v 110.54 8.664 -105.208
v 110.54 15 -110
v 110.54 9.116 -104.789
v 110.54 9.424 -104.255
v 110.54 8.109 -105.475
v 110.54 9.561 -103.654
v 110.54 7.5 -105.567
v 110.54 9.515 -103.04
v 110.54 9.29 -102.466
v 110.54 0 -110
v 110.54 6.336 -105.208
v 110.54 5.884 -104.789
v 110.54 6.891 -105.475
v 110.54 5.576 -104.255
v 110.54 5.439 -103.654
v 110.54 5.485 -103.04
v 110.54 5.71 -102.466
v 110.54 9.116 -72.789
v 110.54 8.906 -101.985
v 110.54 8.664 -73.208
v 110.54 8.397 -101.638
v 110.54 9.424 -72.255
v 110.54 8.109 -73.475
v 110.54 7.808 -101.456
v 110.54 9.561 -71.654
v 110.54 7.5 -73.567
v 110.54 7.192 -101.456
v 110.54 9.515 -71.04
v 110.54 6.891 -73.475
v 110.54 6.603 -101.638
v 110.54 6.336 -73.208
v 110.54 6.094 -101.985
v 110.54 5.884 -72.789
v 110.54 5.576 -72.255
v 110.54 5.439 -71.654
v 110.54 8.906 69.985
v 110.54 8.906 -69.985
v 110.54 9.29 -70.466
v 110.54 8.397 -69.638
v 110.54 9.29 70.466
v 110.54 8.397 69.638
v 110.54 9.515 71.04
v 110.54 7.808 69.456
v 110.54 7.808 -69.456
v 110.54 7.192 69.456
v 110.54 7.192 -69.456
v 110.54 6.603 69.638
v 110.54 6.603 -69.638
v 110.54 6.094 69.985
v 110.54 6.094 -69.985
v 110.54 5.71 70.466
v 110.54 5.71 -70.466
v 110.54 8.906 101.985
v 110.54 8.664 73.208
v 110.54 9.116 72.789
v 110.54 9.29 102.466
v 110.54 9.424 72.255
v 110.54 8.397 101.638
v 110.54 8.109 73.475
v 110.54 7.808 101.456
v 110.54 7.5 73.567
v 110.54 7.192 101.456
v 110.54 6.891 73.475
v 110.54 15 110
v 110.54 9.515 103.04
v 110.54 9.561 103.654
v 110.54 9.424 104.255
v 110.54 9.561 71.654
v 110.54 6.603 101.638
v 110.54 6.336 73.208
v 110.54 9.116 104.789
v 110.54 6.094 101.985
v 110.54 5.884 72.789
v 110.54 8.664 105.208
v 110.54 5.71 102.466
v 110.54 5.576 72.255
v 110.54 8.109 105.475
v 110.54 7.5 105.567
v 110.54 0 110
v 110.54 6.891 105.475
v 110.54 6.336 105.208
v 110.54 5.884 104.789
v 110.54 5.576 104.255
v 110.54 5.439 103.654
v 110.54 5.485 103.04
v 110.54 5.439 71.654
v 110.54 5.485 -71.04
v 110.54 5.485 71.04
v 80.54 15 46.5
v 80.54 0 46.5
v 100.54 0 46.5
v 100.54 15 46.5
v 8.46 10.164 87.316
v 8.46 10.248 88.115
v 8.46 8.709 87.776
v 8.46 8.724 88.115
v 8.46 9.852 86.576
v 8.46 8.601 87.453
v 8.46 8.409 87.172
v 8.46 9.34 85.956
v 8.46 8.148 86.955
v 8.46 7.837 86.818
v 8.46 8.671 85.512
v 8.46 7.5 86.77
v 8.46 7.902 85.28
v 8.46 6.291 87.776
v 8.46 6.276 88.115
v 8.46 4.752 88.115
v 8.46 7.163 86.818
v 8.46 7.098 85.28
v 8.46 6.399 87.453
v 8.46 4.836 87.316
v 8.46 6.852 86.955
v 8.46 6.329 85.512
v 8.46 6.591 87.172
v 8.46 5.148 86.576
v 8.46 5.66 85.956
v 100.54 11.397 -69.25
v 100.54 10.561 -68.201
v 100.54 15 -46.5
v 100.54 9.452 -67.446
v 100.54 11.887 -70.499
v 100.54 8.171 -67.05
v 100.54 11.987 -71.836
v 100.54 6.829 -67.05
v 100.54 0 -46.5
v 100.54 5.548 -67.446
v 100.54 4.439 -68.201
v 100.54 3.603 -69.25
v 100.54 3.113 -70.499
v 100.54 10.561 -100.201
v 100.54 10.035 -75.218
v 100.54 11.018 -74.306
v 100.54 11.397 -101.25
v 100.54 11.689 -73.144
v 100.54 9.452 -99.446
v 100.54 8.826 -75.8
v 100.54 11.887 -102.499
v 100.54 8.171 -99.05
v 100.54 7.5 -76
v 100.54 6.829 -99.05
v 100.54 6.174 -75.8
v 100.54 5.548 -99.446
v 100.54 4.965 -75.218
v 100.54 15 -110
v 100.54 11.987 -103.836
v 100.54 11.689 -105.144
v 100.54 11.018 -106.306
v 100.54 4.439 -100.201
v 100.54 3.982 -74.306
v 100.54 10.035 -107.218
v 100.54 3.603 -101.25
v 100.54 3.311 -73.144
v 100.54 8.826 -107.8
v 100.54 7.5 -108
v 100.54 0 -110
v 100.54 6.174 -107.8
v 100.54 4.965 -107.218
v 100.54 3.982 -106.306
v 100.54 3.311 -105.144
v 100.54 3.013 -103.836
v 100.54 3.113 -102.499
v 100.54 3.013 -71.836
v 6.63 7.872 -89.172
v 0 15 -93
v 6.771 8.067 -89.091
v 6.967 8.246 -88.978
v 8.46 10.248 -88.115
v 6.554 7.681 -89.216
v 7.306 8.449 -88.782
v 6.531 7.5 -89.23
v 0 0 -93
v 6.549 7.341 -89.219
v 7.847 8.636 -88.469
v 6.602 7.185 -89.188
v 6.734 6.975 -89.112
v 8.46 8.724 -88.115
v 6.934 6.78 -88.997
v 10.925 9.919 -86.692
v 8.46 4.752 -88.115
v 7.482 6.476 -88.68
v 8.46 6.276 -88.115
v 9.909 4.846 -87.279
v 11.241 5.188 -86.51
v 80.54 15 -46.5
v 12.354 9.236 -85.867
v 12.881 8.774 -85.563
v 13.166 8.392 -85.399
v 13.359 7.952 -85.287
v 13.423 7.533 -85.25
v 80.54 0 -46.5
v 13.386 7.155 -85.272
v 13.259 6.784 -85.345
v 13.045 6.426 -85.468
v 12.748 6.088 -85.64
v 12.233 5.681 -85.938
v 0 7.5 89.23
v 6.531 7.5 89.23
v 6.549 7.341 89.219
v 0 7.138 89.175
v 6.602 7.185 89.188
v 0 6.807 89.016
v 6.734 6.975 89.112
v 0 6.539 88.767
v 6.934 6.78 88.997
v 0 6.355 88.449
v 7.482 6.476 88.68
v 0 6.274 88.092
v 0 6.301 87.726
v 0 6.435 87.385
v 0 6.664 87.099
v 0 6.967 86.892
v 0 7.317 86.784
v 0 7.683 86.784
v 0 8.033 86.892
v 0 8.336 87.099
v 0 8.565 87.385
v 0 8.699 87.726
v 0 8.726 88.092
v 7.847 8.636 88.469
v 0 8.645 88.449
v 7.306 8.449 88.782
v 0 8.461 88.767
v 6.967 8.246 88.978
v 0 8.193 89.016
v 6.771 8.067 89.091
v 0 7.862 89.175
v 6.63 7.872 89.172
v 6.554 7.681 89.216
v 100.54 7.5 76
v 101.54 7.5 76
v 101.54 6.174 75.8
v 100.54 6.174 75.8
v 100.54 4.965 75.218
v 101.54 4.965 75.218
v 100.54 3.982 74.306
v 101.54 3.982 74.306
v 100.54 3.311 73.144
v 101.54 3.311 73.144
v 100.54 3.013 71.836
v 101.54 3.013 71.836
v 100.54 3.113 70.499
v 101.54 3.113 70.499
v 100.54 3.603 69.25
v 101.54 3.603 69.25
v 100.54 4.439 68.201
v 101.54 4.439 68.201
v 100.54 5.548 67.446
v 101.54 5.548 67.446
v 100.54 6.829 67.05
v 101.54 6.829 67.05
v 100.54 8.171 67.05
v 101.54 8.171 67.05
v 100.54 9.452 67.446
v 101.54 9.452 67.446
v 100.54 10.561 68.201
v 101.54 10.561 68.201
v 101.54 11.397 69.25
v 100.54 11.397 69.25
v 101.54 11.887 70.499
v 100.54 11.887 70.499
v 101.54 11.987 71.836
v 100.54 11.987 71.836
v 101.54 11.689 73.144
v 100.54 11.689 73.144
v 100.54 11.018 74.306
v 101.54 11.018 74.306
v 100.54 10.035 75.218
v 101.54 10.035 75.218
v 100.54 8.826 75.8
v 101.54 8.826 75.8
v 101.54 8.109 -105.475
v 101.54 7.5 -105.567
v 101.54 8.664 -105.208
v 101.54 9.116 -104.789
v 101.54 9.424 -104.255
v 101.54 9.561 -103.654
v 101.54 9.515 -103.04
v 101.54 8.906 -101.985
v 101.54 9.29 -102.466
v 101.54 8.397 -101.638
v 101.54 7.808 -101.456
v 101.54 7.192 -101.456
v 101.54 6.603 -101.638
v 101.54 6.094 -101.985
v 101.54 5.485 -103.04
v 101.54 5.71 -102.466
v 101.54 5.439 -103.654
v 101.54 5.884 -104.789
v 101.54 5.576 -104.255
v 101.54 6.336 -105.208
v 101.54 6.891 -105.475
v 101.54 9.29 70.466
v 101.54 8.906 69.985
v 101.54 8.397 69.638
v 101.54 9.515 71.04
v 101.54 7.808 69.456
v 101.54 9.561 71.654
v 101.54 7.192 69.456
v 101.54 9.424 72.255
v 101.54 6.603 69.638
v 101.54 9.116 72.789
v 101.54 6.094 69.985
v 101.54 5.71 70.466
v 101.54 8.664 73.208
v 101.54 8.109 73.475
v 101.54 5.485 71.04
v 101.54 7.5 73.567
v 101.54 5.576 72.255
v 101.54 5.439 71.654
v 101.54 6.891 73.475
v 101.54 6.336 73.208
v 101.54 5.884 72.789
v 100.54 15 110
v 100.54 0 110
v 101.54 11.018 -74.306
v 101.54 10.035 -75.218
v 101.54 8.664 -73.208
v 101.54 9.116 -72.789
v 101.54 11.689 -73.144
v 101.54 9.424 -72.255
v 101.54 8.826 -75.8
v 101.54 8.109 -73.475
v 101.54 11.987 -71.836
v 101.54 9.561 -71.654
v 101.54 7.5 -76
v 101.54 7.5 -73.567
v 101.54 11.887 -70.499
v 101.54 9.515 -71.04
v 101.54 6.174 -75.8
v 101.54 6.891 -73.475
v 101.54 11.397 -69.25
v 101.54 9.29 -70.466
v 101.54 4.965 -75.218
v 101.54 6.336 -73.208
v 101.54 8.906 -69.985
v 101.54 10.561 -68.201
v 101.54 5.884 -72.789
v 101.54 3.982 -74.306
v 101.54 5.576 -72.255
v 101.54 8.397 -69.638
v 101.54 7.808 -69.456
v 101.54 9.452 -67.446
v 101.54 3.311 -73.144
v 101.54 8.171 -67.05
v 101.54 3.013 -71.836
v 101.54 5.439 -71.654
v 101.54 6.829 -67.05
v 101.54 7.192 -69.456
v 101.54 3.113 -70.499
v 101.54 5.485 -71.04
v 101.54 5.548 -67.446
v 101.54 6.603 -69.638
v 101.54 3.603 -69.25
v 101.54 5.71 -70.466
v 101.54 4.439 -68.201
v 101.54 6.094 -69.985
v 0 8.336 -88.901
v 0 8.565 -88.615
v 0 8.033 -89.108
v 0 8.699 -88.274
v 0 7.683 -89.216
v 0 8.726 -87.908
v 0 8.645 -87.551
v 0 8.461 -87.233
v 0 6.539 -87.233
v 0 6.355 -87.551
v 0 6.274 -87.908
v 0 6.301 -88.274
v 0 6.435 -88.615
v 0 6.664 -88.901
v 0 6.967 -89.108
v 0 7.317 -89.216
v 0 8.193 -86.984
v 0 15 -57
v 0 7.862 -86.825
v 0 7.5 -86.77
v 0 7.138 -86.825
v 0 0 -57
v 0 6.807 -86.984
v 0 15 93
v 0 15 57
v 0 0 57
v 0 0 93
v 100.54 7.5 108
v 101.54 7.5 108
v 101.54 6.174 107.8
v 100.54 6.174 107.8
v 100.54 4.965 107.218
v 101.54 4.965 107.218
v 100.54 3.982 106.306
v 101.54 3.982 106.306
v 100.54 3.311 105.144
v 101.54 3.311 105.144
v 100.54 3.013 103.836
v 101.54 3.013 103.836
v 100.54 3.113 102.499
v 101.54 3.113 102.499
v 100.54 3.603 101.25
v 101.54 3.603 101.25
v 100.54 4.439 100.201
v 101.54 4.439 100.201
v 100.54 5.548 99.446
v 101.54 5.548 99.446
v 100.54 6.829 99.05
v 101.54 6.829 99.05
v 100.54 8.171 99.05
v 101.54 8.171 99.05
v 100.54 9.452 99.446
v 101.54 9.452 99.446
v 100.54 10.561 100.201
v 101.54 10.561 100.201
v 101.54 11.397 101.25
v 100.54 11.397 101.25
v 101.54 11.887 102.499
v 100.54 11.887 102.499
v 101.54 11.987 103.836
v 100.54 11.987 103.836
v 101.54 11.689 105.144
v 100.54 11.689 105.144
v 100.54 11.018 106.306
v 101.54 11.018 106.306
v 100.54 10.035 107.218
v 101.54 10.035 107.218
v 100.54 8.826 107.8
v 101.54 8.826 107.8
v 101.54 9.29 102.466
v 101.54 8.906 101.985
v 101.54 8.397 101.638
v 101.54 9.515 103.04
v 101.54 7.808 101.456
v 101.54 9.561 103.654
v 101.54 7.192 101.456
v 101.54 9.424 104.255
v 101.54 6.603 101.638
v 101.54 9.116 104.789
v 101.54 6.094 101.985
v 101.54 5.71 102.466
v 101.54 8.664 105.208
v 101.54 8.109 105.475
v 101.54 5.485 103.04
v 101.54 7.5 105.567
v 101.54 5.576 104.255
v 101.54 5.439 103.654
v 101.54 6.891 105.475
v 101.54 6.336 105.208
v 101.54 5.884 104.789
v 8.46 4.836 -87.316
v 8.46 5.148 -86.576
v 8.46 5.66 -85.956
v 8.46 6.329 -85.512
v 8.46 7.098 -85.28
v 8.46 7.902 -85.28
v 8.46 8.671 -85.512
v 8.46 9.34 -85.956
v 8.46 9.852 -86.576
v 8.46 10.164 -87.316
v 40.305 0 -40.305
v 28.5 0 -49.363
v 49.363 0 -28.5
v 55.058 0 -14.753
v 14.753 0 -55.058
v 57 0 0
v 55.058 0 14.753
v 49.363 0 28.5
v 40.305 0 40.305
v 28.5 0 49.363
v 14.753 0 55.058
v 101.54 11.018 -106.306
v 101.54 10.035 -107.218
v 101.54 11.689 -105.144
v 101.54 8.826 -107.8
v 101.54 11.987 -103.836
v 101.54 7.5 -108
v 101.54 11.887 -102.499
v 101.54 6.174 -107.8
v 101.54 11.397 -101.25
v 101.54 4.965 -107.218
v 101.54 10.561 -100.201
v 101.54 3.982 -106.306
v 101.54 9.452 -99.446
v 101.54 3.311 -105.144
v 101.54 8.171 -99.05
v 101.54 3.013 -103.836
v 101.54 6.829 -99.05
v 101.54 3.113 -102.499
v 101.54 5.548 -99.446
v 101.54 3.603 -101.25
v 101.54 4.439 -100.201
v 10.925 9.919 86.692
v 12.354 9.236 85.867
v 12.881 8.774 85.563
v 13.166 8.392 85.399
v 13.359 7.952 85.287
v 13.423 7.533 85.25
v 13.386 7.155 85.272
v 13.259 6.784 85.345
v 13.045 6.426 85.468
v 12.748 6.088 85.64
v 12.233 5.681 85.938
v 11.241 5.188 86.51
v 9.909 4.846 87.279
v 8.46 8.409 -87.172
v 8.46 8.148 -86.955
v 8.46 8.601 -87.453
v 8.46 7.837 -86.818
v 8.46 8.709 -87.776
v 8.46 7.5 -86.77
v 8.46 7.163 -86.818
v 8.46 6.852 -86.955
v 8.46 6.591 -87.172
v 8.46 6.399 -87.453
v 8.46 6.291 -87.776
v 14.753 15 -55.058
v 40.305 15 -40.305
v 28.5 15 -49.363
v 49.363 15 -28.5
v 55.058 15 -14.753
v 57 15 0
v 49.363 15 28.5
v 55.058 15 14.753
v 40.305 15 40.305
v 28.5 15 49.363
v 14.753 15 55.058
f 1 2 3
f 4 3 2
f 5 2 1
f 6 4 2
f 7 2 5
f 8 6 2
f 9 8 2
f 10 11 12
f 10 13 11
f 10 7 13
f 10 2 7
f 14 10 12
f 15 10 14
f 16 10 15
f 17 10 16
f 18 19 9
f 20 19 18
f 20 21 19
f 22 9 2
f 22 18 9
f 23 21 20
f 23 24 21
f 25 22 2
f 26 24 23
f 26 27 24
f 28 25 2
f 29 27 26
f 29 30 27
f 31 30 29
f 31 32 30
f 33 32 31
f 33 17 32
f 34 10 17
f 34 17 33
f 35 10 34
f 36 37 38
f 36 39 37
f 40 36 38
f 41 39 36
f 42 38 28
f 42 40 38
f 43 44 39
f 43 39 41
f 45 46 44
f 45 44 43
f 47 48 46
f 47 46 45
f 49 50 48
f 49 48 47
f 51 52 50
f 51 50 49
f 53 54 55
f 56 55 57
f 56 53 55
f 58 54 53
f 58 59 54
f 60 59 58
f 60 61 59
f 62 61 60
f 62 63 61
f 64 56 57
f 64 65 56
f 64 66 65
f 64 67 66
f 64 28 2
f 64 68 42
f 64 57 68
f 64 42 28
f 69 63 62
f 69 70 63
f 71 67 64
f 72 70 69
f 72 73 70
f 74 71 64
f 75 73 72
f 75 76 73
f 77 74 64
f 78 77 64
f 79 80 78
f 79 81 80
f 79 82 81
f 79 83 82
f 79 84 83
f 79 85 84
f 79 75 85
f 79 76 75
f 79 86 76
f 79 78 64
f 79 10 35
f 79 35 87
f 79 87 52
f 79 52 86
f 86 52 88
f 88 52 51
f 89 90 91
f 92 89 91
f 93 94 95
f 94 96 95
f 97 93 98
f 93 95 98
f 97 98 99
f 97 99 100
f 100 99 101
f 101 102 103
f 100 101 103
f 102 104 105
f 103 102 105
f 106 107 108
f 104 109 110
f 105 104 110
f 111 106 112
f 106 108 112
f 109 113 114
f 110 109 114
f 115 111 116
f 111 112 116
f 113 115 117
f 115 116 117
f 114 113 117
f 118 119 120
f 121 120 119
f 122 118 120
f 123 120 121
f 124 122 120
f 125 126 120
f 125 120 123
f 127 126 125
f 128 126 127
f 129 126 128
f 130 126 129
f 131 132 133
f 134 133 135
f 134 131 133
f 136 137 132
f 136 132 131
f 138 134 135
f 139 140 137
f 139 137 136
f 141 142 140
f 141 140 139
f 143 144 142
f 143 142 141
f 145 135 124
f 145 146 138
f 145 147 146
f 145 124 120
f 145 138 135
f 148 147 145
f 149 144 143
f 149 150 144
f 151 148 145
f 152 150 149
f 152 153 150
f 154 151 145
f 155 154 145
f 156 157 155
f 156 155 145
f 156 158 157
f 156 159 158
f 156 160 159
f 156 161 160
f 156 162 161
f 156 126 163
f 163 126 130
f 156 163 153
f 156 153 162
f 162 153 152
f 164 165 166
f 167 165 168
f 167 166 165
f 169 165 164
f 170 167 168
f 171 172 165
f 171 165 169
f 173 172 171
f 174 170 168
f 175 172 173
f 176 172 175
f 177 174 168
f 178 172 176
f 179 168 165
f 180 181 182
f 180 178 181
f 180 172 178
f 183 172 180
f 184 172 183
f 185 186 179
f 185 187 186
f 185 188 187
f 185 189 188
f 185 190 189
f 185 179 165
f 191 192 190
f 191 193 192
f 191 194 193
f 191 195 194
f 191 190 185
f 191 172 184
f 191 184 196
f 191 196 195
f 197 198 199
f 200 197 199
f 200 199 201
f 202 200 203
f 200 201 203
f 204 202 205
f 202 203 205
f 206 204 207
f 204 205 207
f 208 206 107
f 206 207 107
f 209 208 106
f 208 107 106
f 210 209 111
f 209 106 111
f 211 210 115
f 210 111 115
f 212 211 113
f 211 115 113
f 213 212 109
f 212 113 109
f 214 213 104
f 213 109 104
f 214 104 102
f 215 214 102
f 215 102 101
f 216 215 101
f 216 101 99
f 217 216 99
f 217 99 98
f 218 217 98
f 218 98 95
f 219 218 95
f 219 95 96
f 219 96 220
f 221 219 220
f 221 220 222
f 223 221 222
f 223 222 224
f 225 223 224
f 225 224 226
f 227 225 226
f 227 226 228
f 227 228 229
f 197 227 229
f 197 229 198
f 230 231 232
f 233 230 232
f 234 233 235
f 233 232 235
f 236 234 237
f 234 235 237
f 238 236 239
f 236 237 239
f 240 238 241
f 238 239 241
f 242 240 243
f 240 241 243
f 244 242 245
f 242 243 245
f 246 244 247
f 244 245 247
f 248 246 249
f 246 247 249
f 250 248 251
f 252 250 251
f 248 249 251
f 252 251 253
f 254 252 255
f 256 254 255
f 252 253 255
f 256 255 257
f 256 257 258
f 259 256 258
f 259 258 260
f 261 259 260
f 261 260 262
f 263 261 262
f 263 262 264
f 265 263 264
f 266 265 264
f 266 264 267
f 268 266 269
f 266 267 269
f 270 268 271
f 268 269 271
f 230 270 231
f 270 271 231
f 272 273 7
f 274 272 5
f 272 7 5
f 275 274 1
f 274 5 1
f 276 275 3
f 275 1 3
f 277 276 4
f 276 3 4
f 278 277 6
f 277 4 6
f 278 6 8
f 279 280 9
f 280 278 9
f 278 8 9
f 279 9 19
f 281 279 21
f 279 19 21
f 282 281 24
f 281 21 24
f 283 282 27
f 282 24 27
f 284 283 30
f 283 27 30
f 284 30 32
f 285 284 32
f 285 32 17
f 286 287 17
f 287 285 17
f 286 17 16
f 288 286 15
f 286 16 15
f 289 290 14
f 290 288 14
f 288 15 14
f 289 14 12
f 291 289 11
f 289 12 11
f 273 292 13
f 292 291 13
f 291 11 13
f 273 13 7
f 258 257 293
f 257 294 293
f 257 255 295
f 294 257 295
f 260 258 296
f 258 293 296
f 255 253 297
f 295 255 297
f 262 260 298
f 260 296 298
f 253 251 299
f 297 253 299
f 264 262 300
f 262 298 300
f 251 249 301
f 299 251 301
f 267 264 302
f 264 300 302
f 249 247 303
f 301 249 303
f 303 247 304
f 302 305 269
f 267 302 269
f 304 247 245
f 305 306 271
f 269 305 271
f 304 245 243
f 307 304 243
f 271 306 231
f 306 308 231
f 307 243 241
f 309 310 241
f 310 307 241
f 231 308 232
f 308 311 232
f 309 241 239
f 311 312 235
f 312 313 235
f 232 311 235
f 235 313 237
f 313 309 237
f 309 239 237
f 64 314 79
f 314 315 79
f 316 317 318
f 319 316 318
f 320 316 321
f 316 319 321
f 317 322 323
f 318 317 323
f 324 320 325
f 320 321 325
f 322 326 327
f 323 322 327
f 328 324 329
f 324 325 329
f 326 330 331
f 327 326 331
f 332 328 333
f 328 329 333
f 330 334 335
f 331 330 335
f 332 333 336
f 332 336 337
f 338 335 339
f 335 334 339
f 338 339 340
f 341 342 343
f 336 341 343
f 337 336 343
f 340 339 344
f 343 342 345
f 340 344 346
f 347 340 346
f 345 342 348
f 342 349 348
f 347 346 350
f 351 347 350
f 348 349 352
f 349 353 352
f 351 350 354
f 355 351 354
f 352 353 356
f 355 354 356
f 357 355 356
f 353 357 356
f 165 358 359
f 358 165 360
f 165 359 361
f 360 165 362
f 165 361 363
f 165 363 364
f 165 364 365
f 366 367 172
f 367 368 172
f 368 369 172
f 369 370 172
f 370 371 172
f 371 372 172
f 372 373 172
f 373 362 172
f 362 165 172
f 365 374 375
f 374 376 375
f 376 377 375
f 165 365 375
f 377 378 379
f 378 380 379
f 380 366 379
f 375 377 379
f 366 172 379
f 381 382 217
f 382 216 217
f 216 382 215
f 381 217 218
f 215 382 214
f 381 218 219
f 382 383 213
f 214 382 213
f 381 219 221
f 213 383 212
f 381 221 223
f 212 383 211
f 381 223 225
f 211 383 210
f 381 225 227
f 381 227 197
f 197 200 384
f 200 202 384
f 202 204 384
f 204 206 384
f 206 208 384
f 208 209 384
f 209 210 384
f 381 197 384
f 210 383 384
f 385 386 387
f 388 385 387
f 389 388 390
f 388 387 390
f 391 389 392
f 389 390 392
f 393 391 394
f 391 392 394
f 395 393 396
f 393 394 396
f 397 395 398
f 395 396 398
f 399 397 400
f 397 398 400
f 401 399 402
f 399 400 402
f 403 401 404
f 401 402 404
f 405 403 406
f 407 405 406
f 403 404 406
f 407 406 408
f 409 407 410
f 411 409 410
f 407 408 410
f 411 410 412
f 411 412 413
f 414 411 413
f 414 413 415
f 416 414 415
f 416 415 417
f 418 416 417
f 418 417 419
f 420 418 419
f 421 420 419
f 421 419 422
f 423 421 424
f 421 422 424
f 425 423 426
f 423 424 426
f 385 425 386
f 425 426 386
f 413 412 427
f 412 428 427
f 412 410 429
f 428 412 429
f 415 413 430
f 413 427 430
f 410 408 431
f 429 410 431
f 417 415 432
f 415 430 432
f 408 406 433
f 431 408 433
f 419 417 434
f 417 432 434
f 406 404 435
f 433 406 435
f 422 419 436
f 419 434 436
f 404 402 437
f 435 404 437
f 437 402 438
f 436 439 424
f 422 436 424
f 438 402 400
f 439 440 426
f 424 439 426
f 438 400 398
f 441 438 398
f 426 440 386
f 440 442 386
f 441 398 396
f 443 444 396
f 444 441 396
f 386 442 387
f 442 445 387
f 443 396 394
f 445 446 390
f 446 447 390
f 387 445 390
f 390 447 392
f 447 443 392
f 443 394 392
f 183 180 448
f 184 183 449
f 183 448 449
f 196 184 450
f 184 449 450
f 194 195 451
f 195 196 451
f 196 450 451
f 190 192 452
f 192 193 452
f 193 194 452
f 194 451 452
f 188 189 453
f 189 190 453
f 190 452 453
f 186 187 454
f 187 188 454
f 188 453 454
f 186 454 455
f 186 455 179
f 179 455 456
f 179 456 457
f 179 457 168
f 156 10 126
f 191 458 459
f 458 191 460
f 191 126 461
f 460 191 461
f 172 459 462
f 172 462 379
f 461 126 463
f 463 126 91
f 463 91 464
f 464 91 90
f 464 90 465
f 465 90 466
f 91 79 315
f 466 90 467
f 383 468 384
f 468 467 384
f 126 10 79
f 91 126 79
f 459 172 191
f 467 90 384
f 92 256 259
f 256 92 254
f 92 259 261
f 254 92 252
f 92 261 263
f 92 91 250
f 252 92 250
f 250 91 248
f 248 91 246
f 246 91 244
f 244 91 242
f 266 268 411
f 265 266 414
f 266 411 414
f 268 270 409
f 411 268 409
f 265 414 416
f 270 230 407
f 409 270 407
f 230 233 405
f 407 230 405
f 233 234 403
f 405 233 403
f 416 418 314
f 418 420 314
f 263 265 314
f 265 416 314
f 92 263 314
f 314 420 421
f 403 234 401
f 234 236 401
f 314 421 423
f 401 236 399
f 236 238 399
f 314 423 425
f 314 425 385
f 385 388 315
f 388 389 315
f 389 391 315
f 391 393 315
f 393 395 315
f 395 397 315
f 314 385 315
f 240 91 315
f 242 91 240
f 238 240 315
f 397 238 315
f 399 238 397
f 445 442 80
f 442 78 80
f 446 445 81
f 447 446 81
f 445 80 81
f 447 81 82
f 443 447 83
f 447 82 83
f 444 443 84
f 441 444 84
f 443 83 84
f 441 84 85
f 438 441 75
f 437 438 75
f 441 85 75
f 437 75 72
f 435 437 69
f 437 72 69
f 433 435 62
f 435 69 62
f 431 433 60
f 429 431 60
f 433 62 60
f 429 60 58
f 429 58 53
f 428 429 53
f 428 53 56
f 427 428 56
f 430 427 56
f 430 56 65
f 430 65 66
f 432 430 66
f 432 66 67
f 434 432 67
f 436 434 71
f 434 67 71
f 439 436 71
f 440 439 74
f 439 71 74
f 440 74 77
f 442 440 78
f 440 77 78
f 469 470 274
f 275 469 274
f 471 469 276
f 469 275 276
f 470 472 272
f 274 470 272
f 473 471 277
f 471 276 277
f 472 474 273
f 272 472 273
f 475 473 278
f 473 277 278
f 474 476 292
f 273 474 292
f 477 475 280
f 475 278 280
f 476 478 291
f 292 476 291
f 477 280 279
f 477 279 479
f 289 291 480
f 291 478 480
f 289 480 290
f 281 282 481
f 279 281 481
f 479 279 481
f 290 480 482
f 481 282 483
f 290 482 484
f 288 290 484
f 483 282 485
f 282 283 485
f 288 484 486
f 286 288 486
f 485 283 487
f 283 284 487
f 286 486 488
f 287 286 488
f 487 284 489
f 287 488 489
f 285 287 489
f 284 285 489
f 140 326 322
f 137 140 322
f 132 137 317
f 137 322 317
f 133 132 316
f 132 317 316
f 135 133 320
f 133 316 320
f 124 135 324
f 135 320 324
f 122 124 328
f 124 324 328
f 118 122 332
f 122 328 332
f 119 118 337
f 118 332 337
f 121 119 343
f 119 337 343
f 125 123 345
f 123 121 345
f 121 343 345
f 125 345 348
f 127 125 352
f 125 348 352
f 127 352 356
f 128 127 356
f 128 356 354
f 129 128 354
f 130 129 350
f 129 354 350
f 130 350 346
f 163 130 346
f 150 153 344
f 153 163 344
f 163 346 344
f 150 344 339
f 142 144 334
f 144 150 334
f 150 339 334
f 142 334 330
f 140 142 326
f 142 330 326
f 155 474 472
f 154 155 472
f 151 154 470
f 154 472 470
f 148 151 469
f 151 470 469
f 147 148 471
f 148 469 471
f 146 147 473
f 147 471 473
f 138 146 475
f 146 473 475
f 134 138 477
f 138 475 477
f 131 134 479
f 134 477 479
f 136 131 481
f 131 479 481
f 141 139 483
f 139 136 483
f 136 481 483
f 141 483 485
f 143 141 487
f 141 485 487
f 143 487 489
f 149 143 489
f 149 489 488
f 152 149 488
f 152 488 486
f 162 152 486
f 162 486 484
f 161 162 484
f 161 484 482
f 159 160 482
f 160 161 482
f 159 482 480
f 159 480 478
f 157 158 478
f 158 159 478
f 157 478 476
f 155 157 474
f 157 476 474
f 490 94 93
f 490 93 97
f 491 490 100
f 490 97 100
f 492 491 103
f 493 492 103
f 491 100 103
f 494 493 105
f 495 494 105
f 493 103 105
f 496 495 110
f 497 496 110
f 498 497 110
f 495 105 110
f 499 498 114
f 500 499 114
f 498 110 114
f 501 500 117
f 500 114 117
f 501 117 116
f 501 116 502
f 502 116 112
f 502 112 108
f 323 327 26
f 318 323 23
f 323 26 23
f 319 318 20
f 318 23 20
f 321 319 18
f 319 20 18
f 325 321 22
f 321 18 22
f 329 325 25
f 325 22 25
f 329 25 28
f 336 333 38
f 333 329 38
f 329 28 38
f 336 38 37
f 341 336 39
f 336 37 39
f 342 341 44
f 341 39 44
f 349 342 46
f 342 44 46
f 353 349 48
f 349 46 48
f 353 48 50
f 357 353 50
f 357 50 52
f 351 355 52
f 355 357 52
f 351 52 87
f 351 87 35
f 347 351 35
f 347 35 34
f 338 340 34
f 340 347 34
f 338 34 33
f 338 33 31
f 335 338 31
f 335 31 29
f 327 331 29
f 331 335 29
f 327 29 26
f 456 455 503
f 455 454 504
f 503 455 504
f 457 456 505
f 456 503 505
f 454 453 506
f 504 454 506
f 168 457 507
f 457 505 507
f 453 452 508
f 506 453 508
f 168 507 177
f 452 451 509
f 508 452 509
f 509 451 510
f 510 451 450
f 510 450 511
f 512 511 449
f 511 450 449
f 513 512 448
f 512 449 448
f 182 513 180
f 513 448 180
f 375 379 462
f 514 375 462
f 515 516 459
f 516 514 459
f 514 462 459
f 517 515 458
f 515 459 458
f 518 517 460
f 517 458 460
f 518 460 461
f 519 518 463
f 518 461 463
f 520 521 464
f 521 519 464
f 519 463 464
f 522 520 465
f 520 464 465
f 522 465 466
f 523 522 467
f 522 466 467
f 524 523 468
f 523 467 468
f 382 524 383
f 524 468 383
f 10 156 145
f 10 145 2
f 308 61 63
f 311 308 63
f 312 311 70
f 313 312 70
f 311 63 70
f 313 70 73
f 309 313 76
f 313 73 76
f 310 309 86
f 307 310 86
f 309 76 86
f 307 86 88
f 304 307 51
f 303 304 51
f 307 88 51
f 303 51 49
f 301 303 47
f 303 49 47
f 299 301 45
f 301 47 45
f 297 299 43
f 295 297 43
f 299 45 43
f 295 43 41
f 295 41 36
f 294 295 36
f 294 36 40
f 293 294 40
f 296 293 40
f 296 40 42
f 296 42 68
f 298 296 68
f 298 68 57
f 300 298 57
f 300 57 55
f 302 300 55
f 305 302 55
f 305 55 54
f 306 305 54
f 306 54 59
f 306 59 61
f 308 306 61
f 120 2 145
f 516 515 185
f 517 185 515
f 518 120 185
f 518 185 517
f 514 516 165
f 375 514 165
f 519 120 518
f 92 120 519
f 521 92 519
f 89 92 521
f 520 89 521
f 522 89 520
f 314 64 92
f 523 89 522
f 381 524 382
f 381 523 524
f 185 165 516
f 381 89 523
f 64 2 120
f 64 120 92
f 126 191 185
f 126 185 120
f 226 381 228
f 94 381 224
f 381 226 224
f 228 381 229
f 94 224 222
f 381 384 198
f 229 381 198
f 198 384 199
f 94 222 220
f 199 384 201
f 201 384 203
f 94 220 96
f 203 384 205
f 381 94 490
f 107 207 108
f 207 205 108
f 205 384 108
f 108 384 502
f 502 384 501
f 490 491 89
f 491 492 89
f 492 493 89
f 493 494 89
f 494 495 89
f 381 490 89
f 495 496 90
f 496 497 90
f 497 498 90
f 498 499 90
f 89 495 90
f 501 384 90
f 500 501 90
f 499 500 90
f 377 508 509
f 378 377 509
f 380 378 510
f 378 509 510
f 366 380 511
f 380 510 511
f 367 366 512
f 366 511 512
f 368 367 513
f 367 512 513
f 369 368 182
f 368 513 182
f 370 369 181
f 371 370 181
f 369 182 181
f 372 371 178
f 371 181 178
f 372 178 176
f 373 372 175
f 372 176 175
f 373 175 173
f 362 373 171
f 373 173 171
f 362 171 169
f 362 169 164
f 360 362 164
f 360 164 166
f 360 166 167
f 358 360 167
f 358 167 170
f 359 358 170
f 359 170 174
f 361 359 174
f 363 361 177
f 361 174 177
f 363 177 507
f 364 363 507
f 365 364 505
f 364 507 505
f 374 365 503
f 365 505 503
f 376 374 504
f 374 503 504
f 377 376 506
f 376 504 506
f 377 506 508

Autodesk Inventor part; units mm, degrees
sketch "スケッチ1" plane through (0, 0, 0) normal (0, 1, 0) x (-1, 0, 0)
  arc A0 (0, 57) -> (0, -57) centre (0, 0) ccw
  line L0 (0, 57) -> (0, 93) construction
  line L1 (0, 57) -> (0, 93)
  line L2 (0, 93) -> (-80.5404, 46.5)
  line L3 (-80.5404, 46.5) -> (-100.5404, 46.5)
  line L4 (-100.5404, 46.5) -> (-100.5404, 110)
  line L5 (-100.5404, 110) -> (-110.5404, 110)
  line L6 (-110.5404, 110) -> (-110.5404, 0)
  line L7 (0, -57) -> (0, -93) construction
  line L8 (0, -93) -> (-80.5404, -46.5)
  line L9 (-80.5404, -46.5) -> (-100.5404, -46.5)
  line L10 (-100.5404, -46.5) -> (-100.5404, -110)
  line L11 (-100.5404, -110) -> (-110.5404, -110)
  line L12 (-110.5404, -110) -> (-110.5404, 0)
  line L13 (0, -93) -> (0, -57)
  dimension "d0" = 57
  dimension "d7" = 10
sketch "スケッチ2" plane through (0, 0, 0) normal (0, 1, 0) x (-1, 0, 0)
  point P0 (0, 0)
extrude "押し出し1" add sketch "スケッチ1" along normal blind 15
sketch "スケッチ3" plane through (100.5404, 0, 46.5) normal (-1, 0, 0) x (0, 0, 1)
  point P0 (-46.5, 0)
sketch "スケッチ4" plane through (0, 0, 57) normal (-1, 0, 0) x (0, 0, 1)
  line L0 (0, 0) -> (0, 15) projected
  line L1 (0, 0) -> (31, 0)
  line L2 (36, 0) -> (36, 15) projected
  line L3 (31, 0) -> (31, 7.5)
  point P0 (-57, 0)
  dimension "d10" = 31
  dimension "d11" = 7.5
hole "穴1" at (0, 7.5, 88) direction (1, 0, 0) diameter 2.459 depth 31.54 tip angle 118 thread size "M3x0.5" class "6H" standard "ISO Metric profile"
sketch "スケッチ5" plane through (0, 0, -93) normal (-1, 0, 0) x (0, 0, 1)
  line L0 (36, 0) -> (36, 15) projected
  line L1 (36, 0) -> (5, 0)
  line L2 (-17, 0) -> (46.5, 0) projected
  line L3 (5, 0) -> (5, 7.5)
  line L4 (-17, 15) -> (46.5, 15) projected
  point P0 (93, 0)
  dimension "d19" = 31
  dimension "d20" = 7.5
hole "穴2" at (0, 7.5, -88) direction (1, 0, 0) diameter 2.459 depth 35.79 tip angle 118 thread size "M3x0.5" class "6H" standard "ISO Metric profile"
sketch "スケッチ7" plane through (0, 0, -93) normal (0.5, 0, -0.866) x (-0.866, 0, -0.5)
  ellipse E0 centre (-10, 7.5) end of major axis (-12.459, 7.5) minor radius 1.2295 projected
  point P0 (-46.5, 0)
  point P1 (-10, 7.5)
ref_plane "作業平面1" through (8.6603, 7.5, -88) normal (0, 0, 1) x (1, 0, 0)
sketch "スケッチ8" plane through (8.6603, 7.5, -88) normal (0, 0, 1) x (1, 0, 0)
  ellipse E0 centre (0, 0) end of major axis (-2.1296, 0) minor radius 1.2295 projected
  line L0 (0, 0) -> (4.8, 0)
  point P0 (-8.6603, -7.5)
  dimension "d28" = 4.8
ref_plane "作業平面2" through (13.4603, 7.5, -88) normal (-1, 0, 0) x (0, 0, 1)
sketch "スケッチ9" plane through (13.4603, 7.5, -88) normal (-1, 0, 0) x (0, 0, 1)
  point P0 (88, -7.5)
  point P1 (0, 0)
hole "穴3" at (13.4603, 7.5, -88) direction (-1, 0, 0) diameter 2.459 end through all counterbore diameter 5.5 counterbore depth 5 thread size "M3x0.5" class "6H" standard "ISO Metric profile"
sketch "スケッチ10" plane through (100.5404, 0, 46.5) normal (-1, 0, 0) x (0, 0, 1)
  line L0 (63.5, 0) -> (63.5, 15) projected
  line L1 (63.5, 7.5) -> (57, 7.5)
  line L2 (46.5, 0) -> (46.5, 15) projected
  line L3 (57, 7.5) -> (25, 7.5)
  point P0 (-46.5, 0)
  dimension "d36" = 6.5
  dimension "d37" = 32
hole "穴4" at (100.5404, 7.5, 103.5) at (100.5404, 7.5, 71.5) direction (1, 0, 0) diameter 4.134 end through all counterbore diameter 9 counterbore depth 1 thread size "M5x0.8" class "6H" standard "ISO Metric profile"
ref_plane "作業平面3" through (0, 0, 0) normal (0, 0, 1) x (1, 0, 0)
mirror "ミラー1" about plane through (0, 0, 0) normal (0, 0, 1) of "穴4", "穴3"
properties part number "nowtrying"
